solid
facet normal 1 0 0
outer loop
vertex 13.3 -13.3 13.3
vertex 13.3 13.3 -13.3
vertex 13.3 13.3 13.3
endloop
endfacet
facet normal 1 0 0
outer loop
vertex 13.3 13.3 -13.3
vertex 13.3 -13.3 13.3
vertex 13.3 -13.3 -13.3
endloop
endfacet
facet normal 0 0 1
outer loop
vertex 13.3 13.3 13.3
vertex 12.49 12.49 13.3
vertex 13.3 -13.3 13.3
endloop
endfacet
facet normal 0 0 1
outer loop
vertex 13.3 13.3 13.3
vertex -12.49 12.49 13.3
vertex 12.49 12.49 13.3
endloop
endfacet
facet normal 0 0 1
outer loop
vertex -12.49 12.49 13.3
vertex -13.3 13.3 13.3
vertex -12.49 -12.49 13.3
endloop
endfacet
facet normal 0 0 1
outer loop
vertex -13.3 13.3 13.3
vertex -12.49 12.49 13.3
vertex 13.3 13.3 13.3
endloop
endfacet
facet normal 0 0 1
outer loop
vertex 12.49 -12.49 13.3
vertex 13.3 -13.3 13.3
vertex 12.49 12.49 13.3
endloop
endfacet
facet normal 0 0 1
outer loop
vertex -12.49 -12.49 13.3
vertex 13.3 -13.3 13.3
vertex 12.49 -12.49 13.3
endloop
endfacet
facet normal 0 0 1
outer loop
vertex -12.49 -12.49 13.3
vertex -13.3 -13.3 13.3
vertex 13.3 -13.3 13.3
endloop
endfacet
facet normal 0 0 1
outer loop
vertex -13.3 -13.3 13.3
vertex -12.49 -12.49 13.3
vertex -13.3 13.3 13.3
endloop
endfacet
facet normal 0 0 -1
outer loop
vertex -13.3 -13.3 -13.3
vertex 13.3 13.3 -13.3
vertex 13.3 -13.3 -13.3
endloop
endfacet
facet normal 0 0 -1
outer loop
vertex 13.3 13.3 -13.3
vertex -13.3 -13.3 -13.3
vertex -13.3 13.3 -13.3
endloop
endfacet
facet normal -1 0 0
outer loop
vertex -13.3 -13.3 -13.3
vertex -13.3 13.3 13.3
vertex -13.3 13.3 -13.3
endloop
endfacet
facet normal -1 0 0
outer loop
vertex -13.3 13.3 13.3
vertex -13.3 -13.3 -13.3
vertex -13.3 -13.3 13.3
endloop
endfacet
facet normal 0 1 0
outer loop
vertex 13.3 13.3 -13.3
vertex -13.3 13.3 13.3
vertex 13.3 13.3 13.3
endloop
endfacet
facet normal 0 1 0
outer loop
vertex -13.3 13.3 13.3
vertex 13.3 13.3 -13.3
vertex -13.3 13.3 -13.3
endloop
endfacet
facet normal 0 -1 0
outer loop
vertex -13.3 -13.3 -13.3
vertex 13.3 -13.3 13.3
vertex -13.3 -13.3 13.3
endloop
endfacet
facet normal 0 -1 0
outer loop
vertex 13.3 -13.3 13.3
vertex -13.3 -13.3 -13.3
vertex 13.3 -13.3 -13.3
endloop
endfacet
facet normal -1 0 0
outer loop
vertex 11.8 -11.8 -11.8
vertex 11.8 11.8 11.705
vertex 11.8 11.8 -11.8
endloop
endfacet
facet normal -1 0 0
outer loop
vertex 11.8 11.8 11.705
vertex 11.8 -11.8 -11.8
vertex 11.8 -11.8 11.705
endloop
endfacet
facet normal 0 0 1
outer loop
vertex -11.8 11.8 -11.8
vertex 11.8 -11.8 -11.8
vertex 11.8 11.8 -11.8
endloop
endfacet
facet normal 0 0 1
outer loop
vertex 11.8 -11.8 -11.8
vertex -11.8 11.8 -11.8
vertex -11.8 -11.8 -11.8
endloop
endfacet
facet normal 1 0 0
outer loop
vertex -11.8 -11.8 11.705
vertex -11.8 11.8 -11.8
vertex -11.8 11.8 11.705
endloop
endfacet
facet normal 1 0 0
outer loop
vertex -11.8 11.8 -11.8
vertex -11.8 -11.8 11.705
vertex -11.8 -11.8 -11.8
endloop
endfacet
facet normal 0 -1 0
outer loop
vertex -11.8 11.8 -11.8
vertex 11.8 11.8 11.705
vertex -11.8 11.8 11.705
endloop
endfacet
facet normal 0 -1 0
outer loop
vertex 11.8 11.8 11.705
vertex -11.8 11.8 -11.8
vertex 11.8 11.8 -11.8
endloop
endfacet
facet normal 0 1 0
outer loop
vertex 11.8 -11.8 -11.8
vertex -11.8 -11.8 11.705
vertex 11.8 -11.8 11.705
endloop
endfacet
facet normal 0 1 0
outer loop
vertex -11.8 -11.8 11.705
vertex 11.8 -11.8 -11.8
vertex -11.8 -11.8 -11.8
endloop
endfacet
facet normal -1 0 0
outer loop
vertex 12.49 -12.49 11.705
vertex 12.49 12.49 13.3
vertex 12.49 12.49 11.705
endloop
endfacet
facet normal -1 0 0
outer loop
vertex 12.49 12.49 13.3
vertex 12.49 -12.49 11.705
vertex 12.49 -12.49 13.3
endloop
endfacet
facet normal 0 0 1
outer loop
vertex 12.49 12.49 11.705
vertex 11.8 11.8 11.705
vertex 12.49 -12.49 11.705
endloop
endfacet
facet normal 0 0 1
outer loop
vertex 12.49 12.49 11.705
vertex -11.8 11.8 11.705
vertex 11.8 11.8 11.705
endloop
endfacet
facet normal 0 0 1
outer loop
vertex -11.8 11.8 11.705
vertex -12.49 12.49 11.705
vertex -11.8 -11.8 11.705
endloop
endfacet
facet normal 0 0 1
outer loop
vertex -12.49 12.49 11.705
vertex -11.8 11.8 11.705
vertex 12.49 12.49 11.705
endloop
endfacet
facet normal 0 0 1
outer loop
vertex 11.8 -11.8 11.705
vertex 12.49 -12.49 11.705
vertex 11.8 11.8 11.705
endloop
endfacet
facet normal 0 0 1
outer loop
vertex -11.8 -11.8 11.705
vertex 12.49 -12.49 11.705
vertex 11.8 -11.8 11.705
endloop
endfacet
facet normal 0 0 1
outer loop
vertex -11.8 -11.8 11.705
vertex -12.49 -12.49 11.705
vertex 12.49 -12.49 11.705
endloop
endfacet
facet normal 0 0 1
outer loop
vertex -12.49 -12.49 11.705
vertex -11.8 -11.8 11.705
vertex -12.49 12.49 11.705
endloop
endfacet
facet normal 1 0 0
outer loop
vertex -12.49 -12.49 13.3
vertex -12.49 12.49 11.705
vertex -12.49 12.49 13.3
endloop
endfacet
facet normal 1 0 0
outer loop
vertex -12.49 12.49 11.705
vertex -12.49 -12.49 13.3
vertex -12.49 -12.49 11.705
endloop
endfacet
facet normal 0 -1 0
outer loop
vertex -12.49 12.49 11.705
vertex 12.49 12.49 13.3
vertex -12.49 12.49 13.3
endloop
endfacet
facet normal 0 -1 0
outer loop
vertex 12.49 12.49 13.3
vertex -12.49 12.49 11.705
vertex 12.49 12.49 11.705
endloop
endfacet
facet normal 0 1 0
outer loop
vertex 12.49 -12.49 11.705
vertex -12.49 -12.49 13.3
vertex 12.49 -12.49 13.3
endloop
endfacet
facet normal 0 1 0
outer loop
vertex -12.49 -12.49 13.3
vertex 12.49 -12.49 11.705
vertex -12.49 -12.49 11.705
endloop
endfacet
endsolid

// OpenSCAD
// Cube Jeu Sphère 40mm

// changelog
// v5
// - Bouchon droit

version = 5;

arete = 26.6;
epaisseurParoi = 1.5;
r = 0.19; // résolution d'impression sur l'axe Z

// distance entre la paroi extérieure et la découpe
// minimum semble etre >nozzle_diameter pour Zortrax M200
offset_decoupe_bouchon = 0.81;
bouchonOffset = 0.3;

// Permet meilleur encastrement du bouchon pour ne pas qu'il
// dépasse après collage
decoupeZOffset = -r/2;

//decoupe_bouchon();
corps_ouvert();
// bouchon();
//trou();

module corps_ouvert() {
    difference() {
        cube_creux();
        #decoupe_bouchon(offset_decoupe_bouchon, decoupeZOffset);
    }
}

module bouchon() {
    difference () {
        intersection() {
            cube_creux();
            decoupe_bouchon(offset_decoupe_bouchon+bouchonOffset);
        }
    }
}

module cube_creux() {
    difference() {
        cube(arete, center=true);
        cube(arete-2*epaisseurParoi, center=true);
    }
}

module decoupe_bouchon(d, zOffset = 0) {
    a = arete - 2*d;
    translate([0,0,arete/2+((epaisseurParoi+1)/2)-epaisseurParoi+zOffset])
        cube([a, a, epaisseurParoi+1], center=true);
}
